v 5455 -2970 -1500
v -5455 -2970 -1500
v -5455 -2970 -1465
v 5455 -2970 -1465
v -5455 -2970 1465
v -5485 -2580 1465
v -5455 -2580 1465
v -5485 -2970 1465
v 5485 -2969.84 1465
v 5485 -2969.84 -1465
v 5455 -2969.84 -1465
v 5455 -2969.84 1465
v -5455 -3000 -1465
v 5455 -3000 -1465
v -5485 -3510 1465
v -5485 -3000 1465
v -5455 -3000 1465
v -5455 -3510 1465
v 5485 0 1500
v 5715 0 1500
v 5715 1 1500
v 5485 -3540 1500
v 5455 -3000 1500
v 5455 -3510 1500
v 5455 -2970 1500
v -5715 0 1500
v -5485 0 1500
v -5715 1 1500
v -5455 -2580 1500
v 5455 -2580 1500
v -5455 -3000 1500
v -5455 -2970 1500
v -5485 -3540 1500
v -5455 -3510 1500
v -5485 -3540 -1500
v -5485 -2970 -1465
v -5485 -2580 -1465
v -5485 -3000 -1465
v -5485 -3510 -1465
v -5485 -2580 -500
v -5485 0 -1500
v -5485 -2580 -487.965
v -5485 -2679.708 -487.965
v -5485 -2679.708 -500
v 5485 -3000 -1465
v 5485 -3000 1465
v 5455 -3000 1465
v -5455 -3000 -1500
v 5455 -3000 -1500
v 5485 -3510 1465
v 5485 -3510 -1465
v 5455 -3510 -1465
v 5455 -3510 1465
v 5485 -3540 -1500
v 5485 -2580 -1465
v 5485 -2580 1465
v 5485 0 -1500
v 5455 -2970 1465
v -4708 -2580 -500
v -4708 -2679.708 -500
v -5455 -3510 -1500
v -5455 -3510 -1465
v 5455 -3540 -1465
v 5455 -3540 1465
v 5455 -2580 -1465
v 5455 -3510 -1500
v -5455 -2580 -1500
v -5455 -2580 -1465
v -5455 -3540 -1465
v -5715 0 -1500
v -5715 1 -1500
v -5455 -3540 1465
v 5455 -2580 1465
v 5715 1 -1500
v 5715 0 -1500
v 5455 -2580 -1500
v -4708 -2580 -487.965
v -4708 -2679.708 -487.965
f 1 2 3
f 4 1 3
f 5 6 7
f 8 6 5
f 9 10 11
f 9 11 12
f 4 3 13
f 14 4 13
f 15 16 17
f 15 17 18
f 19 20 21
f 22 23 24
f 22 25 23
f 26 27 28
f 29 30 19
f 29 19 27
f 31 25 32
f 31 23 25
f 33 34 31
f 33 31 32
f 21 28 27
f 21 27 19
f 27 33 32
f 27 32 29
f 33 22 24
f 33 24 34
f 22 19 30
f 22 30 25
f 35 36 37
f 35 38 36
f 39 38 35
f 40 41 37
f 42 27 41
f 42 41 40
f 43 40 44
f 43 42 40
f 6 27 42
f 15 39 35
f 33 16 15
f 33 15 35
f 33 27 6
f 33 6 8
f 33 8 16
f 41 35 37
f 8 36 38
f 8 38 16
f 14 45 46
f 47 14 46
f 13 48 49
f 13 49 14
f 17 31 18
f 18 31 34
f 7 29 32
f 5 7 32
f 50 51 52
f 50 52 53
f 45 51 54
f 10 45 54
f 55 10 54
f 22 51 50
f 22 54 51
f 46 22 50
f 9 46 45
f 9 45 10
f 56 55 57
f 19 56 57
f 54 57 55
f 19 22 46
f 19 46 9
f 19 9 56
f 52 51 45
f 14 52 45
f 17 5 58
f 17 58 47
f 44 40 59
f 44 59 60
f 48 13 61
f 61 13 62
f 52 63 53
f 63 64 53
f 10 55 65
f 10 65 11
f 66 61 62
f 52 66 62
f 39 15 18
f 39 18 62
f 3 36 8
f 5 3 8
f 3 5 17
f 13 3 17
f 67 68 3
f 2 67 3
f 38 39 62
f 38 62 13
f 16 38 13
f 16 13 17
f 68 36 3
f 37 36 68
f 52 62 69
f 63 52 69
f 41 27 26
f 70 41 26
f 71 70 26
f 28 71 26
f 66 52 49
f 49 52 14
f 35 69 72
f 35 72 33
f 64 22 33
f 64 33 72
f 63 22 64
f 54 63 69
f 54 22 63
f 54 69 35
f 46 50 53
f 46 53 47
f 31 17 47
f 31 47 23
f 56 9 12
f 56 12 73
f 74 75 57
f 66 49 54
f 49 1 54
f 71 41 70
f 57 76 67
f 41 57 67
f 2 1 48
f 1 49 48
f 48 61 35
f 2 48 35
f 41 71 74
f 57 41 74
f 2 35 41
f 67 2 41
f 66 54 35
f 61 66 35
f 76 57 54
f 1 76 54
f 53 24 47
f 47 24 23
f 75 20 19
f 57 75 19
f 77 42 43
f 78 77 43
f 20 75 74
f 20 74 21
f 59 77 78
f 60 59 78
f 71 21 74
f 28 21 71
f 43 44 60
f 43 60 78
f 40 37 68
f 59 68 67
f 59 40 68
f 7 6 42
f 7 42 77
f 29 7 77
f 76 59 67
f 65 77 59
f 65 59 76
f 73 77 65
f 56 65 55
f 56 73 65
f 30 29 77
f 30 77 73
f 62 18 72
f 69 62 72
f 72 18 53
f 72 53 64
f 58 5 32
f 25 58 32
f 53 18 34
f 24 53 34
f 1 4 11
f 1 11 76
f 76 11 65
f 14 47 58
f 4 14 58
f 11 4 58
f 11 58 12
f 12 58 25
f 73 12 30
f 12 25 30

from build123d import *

# Parameters (mm, degrees)
F0_W      = 10970
F0_H      = 3000
F1_DEPTH  = 2580
F2_W      = 30
F2_H      = 2930
F3_DEPTH  = 30
F4_W      = 30
F4_H      = 35
F5_DEPTH  = 10940
F6_W      = 510
F6_H      = 2930
F7_DEPTH  = 30
F8_W      = 11430
F8_H      = 3000
F9_DEPTH  = 1
F2_W_2    = 99.7082424164
F2_H_2    = 12.0352804661
F10_DEPTH = 777


# Not quite as in the source:
# - a feature names something its author has since deleted; it is built from what else it names


with BuildPart() as f1:
    # F0 (on Front) → F1 (new body)
    with BuildSketch(Plane.XZ):
        Rectangle(F0_W, F0_H)
    extrude(amount=F1_DEPTH)

    # F2 (on face) → F3 (join)
    with BuildSketch(Plane(origin=(-5485, 0, 0), x_dir=(0, -1, 0), z_dir=(-1, 0, 0))):
        Polygon((3540, 1500), (2580, 1500), (2580, 1465), (2970, 1465), (3000, 1465), (3510, 1465), (3510, -1465), (3000, -1465), (2970, -1465), (2580, -1465), (2580, -1500), (3540, -1500), (3540, -1465), (3540, 1465), align=None)
        with Locations((2985, 0)):
            Rectangle(F2_W, F2_H)
    extrude(amount=-F3_DEPTH)

    # F4 (on face) → F5 (join)
    with BuildSketch(Plane(origin=(-5485, 0, 0), x_dir=(0, -1, 0), z_dir=(-1, 0, 0))):
        with Locations((2985, 1482.5)):
            Rectangle(F4_W, F4_H)
        with Locations((2985, -1482.5)):
            Rectangle(F4_W, F4_H)
        with Locations((3525, -1482.5)):
            Rectangle(F4_W, F4_H)
        with Locations((3525, 1482.5)):
            Rectangle(F4_W, F4_H)
    extrude(amount=-F5_DEPTH)

    # F6 (on face) → F7 (join)
    with BuildSketch(Plane.YZ.offset(5485)):
        Polygon((-3540, -1500), (-2580, -1500), (-2580, -1465), (-2969.8400497437, -1465), (-2969.8400497437, 1465), (-2580, 1465), (-2580, 1500), (-3540, 1500), (-3540, 1465), (-3540, -1465), align=None)
        with Locations((-3255, 0)):
            Rectangle(F6_W, F6_H, mode=Mode.SUBTRACT)
    extrude(amount=-F7_DEPTH)

    # F8 (on face) → F9 (join)
    with BuildSketch(Plane(origin=(0, 0, 0), x_dir=(-1, 0, 0), z_dir=(0, 1, 0))):
        Rectangle(F8_W, F8_H)
    extrude(amount=F9_DEPTH)

    # F2 (on face) → F10 (join)
    with BuildSketch(Plane(origin=(-5485, 0, 0), x_dir=(0, -1, 0), z_dir=(-1, 0, 0))):
        with Locations((2629.8541212082, -493.982359767)):
            Rectangle(F2_W_2, F2_H_2)
    extrude(amount=-F10_DEPTH)


solid = f1.part
